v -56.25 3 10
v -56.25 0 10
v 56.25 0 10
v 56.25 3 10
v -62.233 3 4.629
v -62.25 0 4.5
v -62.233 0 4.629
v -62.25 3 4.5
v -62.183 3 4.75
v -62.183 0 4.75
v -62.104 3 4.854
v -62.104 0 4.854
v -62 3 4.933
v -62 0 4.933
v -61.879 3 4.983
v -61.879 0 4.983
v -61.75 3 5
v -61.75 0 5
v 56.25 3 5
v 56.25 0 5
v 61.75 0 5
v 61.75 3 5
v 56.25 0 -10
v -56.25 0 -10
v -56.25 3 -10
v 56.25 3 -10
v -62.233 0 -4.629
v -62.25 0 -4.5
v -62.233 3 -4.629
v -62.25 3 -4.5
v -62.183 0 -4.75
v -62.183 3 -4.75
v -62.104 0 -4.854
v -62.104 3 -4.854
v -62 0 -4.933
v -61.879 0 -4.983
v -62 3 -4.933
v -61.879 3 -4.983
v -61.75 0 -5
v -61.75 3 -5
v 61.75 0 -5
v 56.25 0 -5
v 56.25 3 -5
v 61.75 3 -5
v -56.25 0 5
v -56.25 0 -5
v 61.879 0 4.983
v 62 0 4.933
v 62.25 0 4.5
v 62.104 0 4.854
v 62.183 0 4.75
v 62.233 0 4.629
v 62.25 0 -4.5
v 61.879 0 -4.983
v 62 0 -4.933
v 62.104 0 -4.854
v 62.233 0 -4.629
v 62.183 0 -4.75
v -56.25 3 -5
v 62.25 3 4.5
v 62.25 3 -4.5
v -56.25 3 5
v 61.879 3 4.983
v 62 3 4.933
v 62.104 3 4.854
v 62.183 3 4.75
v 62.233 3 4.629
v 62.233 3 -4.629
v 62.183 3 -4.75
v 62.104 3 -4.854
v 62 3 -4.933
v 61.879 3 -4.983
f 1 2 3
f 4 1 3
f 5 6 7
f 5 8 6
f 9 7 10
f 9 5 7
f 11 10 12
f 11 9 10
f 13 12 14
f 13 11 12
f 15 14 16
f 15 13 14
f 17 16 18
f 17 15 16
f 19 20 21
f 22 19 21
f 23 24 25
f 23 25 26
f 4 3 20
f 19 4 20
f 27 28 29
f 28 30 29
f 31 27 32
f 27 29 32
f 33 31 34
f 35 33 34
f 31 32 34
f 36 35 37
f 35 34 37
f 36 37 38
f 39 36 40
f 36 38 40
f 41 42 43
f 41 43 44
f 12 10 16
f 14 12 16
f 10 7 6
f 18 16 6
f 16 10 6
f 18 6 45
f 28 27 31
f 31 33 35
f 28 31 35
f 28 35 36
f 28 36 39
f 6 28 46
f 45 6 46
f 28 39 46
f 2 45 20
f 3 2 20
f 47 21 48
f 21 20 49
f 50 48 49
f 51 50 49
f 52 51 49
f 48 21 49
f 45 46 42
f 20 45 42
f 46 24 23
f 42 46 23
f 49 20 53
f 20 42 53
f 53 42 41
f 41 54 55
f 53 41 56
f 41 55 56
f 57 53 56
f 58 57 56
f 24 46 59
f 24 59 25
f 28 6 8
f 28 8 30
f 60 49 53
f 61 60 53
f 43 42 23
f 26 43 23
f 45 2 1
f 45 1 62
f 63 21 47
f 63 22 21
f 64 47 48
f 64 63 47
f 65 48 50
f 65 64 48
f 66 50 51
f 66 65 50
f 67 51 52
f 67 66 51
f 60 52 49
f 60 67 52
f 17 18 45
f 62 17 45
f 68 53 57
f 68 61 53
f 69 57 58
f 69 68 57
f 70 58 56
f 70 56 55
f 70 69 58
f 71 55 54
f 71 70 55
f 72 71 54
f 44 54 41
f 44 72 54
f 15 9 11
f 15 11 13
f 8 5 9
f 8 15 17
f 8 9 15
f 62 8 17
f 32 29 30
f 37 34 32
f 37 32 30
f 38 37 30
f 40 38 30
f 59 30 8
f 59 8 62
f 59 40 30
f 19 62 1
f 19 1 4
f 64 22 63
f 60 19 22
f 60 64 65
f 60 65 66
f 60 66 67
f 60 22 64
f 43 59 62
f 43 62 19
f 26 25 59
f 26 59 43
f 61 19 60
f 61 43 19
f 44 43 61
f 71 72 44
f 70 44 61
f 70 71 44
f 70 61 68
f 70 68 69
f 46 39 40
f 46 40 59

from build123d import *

# Parameters (mm, degrees)
SKETCH_1_W      = 6
SKETCH_1_H      = 10
SKETCH_1_W_2    = 112.5
SKETCH_1_H_2    = 20
EXTRUDE_1_DEPTH = 3
FILLET_1_R      = 0.5


with BuildPart() as part:
    # Эскиз1 → Бобышка-Вытянуть1 (new body)
    with BuildSketch(Plane(origin=(0, 0, 0), x_dir=(1, 0, 0), z_dir=(0, 1, 0))):
        with Locations((-59.25, 0)):
            Rectangle(SKETCH_1_W, SKETCH_1_H)
        Rectangle(SKETCH_1_W_2, SKETCH_1_H_2)
        with Locations((59.25, 0)):
            Rectangle(SKETCH_1_W, SKETCH_1_H)
    extrude(amount=EXTRUDE_1_DEPTH)

    # Скругление1
    fillet_1_edges = [part.edges().sort_by_distance(p)[0] for p in [
        (-62.25, 1.5, 5),
        (-62.25, 1.5, -5),
        (62.25, 1.5, -5),
        (62.25, 1.5, 5),
    ]]
    fillet(fillet_1_edges, radius=FILLET_1_R)


solid = part.part
